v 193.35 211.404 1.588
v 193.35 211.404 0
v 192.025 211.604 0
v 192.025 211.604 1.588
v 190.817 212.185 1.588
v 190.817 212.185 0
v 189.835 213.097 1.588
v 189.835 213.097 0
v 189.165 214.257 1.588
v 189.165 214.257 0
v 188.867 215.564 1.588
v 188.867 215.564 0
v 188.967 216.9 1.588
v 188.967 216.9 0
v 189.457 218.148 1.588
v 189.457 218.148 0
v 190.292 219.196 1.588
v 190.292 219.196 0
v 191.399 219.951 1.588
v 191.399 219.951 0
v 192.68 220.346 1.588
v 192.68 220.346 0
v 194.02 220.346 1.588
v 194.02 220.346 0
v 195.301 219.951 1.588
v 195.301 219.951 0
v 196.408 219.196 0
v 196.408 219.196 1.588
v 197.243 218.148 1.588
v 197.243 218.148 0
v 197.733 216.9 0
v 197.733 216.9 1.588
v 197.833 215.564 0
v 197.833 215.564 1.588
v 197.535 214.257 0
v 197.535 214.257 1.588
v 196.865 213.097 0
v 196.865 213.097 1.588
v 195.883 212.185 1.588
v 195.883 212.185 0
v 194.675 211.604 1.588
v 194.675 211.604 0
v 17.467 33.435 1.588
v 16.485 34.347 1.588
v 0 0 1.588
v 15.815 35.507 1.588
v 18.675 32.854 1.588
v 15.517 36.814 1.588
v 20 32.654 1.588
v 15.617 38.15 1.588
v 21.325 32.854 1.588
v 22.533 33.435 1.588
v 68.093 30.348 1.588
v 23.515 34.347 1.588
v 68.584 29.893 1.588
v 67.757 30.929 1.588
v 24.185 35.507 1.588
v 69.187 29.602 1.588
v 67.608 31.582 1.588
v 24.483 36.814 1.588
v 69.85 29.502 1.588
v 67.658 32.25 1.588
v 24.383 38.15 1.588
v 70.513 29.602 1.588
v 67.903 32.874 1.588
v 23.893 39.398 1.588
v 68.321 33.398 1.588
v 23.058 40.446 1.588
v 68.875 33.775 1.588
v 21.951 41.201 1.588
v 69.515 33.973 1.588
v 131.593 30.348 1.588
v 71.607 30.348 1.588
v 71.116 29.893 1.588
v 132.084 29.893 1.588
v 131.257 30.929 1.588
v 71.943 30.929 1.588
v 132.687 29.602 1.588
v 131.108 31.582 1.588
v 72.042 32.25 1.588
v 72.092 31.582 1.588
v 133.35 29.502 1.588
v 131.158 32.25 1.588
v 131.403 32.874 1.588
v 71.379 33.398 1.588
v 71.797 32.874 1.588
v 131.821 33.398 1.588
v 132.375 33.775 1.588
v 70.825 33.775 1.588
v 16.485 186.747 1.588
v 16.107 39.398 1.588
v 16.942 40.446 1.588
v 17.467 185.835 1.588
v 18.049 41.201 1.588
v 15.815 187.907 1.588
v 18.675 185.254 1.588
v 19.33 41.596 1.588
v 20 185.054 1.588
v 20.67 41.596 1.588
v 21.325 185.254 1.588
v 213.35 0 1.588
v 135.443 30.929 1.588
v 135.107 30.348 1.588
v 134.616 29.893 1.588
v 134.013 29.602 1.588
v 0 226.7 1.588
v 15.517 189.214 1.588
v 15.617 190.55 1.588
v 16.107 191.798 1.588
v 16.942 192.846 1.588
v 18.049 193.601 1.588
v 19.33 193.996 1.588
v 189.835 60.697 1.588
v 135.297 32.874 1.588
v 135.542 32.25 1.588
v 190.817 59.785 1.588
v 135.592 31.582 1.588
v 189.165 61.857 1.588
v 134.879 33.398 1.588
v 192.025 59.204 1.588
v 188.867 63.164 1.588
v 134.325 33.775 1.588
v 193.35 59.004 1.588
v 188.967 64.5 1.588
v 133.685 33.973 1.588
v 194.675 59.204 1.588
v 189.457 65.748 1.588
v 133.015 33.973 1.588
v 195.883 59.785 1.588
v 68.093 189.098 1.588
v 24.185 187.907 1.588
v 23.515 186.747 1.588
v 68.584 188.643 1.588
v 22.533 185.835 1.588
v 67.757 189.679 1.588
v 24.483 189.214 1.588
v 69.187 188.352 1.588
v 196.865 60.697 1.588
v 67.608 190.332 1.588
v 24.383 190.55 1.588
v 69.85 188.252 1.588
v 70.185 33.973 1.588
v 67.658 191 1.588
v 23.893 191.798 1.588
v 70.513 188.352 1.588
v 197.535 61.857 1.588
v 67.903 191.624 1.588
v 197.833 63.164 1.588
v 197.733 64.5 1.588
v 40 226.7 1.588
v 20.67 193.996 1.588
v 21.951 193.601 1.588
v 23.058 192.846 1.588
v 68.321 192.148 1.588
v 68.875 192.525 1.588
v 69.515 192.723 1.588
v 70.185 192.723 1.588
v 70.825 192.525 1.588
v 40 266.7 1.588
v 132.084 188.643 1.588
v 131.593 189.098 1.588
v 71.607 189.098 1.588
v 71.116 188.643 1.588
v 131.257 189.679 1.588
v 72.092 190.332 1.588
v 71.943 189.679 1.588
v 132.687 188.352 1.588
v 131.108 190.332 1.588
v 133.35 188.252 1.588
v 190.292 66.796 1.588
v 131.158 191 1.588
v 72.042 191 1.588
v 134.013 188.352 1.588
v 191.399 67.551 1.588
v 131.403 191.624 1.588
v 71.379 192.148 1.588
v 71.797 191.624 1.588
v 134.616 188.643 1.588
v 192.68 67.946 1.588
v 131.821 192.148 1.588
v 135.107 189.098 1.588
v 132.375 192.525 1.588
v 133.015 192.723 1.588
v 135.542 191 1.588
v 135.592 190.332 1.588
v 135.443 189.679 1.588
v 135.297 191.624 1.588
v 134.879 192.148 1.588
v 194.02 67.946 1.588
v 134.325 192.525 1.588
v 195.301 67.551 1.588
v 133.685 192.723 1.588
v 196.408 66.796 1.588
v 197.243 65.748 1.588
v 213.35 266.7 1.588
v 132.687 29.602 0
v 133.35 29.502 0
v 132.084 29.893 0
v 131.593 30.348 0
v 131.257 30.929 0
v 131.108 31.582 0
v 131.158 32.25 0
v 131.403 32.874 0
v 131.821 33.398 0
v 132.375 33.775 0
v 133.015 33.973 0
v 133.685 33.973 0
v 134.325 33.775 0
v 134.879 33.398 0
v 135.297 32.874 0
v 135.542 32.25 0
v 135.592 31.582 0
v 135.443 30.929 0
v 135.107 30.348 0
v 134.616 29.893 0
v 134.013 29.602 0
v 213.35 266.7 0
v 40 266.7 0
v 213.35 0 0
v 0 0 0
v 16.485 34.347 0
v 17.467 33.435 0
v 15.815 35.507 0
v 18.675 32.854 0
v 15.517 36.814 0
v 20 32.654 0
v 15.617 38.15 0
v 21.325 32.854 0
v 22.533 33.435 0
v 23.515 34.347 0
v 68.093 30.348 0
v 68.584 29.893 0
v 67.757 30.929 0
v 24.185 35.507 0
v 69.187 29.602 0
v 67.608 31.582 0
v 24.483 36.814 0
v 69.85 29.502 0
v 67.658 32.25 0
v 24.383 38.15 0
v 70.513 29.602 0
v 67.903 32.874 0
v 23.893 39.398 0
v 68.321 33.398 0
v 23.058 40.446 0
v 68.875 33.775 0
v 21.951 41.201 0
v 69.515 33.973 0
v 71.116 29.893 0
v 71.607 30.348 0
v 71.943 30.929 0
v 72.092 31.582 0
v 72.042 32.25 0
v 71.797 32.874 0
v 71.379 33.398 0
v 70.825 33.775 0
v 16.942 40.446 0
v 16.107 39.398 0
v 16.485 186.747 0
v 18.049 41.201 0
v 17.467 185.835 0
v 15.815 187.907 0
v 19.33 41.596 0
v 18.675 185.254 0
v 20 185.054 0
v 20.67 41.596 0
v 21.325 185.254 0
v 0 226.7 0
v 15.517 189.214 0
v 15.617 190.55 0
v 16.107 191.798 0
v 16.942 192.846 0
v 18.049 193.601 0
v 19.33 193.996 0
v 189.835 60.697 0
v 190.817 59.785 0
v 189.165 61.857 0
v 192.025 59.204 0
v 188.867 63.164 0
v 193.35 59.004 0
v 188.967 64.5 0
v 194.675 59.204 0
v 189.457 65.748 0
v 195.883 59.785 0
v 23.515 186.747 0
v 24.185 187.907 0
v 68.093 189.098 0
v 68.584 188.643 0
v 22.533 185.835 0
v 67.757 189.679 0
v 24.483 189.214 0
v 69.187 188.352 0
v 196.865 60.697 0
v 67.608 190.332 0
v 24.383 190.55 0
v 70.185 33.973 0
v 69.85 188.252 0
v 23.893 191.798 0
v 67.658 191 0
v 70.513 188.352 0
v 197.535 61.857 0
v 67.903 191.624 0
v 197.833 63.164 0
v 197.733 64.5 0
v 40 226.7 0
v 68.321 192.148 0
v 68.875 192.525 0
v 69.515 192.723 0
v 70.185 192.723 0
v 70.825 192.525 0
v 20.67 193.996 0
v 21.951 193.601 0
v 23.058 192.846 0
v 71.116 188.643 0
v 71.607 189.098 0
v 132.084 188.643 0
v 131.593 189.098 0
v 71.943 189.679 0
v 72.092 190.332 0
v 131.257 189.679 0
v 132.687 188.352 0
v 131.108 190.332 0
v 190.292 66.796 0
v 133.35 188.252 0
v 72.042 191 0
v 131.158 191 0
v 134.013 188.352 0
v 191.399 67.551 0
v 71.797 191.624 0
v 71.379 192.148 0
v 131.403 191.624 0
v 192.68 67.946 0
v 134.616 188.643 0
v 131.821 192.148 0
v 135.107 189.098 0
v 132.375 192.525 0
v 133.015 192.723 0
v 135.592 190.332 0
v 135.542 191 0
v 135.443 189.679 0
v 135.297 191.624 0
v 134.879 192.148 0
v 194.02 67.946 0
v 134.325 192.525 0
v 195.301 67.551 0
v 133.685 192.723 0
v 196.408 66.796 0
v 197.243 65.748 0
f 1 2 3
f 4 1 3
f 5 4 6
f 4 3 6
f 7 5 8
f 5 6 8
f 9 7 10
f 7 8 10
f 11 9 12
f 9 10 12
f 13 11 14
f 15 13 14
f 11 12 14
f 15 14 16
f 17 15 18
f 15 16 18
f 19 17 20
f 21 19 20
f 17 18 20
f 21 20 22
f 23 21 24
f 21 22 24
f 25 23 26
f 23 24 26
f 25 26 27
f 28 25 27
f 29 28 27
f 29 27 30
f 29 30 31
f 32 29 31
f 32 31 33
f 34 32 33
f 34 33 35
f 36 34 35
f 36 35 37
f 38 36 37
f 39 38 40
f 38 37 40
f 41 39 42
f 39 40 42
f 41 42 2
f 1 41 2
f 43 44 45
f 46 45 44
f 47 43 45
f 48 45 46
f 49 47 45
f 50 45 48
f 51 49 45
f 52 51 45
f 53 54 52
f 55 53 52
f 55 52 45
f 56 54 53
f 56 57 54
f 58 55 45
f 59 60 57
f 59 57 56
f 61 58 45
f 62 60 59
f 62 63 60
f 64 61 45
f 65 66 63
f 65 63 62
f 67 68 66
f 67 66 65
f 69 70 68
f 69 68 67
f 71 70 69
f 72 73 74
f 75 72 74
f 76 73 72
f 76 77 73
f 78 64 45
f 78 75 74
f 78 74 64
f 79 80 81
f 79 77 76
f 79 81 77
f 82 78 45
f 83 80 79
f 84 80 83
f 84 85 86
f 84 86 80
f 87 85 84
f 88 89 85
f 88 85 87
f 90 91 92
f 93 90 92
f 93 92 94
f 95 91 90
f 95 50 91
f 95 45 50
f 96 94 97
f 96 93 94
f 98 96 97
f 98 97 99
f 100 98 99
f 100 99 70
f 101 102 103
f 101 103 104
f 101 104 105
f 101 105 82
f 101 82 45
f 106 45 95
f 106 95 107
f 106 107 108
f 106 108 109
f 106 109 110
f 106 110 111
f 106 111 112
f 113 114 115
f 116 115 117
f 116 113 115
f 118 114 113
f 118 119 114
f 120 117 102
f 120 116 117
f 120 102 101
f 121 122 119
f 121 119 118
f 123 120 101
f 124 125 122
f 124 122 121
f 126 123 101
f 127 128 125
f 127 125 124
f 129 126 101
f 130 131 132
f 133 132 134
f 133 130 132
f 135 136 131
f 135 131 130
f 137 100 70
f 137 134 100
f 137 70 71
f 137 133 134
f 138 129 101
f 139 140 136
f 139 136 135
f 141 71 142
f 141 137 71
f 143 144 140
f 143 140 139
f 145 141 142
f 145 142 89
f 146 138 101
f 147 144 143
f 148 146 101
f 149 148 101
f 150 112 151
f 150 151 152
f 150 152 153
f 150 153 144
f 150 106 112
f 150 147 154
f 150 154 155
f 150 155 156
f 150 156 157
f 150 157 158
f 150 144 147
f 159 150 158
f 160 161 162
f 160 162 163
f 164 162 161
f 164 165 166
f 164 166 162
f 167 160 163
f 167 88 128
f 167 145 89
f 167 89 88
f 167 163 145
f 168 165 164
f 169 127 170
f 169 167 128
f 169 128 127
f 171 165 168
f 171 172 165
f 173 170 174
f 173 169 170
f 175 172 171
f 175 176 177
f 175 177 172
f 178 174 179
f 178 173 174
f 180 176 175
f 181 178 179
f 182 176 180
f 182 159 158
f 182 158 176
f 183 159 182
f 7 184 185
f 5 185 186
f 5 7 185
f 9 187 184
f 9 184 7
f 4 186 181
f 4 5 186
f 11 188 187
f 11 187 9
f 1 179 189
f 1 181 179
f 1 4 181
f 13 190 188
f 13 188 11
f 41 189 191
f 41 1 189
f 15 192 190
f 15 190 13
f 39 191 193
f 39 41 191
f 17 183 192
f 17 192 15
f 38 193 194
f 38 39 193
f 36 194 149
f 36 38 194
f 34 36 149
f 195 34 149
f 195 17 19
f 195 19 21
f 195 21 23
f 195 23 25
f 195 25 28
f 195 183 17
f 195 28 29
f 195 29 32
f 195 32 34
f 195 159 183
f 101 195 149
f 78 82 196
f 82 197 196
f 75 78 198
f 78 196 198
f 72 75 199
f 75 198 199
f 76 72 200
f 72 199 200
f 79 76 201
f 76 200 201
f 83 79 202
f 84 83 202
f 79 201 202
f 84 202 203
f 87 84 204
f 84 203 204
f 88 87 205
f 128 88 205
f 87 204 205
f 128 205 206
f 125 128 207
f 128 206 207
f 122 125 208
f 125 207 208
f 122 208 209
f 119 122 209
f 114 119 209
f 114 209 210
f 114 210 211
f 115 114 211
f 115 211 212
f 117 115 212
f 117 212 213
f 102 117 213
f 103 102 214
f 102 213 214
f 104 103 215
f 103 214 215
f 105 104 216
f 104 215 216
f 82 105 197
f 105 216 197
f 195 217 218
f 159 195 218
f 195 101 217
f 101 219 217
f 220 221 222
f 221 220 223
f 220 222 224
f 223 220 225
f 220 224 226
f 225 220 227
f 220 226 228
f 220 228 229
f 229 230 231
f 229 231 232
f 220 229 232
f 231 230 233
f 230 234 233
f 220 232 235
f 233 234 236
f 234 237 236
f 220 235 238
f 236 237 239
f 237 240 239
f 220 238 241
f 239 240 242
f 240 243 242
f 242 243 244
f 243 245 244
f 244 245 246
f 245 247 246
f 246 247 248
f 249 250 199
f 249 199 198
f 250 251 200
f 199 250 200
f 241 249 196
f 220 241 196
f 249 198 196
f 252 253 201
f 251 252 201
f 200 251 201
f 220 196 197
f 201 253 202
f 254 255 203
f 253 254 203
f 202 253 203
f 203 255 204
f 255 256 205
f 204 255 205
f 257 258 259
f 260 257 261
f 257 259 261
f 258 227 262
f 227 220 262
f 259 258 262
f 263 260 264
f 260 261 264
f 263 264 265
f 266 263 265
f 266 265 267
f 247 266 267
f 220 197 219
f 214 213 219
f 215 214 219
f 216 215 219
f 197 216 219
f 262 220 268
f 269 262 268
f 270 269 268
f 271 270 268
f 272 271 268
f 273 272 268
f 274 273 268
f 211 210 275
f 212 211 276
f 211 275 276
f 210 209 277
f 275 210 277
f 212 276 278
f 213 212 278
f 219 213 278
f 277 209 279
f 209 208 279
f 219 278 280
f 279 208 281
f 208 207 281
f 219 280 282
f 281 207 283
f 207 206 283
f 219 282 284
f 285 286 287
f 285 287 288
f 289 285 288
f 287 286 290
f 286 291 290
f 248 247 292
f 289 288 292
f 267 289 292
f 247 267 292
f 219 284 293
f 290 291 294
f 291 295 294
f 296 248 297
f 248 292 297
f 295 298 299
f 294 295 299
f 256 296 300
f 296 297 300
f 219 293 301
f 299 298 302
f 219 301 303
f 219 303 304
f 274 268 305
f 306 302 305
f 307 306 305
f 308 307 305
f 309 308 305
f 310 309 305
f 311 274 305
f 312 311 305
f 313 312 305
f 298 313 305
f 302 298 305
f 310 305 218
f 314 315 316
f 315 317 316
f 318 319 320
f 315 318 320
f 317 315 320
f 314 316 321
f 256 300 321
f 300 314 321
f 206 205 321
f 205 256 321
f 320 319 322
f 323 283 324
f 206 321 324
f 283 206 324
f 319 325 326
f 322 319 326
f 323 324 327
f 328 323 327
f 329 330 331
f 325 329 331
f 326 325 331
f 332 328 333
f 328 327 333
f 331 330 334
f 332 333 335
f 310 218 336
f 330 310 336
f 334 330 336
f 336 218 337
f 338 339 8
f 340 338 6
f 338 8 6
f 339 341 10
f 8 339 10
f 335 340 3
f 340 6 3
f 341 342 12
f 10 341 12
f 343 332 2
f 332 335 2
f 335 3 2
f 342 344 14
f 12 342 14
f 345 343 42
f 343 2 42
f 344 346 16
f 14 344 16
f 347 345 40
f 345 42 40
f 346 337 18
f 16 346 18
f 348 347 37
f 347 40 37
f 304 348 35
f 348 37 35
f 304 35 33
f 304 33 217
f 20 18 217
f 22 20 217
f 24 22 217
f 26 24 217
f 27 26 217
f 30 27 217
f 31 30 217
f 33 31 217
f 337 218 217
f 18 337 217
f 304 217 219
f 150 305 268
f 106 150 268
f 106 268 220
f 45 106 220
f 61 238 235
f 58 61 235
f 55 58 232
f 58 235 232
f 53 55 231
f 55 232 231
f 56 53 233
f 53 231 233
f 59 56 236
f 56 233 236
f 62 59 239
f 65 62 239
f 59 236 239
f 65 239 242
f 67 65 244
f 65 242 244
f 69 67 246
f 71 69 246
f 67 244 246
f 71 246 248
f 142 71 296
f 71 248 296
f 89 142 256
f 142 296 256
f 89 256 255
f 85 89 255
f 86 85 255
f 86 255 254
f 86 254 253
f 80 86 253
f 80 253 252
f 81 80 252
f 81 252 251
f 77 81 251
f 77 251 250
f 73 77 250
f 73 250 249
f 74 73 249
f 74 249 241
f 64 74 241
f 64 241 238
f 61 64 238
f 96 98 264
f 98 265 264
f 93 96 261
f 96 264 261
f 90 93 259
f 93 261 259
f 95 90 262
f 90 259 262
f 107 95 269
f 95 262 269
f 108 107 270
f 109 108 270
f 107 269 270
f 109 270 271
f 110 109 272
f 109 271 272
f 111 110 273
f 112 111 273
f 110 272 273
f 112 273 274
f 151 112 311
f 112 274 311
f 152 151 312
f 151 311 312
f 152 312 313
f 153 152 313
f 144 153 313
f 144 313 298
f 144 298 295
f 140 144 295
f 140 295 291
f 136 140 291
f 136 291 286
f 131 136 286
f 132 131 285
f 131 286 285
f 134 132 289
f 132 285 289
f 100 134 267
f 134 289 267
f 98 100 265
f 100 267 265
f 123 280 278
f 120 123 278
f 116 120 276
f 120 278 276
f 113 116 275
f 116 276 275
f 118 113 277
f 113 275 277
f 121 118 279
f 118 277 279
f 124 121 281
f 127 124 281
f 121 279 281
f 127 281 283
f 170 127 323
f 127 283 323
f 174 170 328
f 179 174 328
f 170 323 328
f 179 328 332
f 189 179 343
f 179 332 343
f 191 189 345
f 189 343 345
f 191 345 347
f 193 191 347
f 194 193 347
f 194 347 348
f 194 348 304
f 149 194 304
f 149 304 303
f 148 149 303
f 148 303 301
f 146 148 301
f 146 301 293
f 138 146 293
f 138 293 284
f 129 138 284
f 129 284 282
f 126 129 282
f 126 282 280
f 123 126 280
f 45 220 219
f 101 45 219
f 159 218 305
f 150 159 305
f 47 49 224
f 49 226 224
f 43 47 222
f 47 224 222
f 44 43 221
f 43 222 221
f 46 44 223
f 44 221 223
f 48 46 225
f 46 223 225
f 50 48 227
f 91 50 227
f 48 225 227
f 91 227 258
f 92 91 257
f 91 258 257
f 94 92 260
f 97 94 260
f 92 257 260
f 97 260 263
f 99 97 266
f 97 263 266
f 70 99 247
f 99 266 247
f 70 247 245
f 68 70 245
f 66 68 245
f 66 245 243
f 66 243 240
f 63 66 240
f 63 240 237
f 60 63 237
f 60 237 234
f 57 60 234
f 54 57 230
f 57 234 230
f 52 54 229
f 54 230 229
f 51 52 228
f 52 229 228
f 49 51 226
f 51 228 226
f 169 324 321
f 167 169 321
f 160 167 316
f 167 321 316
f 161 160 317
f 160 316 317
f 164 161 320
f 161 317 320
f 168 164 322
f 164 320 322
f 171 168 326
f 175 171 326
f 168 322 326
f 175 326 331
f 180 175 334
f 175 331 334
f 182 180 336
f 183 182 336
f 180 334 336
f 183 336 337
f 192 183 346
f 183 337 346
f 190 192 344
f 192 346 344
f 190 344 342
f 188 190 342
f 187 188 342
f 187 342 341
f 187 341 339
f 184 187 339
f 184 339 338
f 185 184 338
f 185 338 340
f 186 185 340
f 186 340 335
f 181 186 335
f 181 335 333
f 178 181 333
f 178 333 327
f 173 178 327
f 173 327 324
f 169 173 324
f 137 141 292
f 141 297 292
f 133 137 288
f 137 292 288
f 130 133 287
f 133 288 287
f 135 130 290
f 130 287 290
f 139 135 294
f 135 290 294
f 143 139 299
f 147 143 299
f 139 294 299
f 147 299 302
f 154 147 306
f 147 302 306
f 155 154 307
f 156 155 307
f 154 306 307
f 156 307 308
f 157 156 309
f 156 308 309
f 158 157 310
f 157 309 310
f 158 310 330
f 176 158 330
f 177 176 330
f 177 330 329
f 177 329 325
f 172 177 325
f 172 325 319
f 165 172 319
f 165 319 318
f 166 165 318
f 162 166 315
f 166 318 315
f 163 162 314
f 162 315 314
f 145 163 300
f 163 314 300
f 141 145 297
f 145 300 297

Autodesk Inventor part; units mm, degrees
ref_plane "YZ Plane" through (0, 0, 0) normal (1, 0, 0) x (0, 1, 0)
ref_plane "XZ Plane" through (0, 0, 0) normal (0, 1, 0) x (-1, 0, 0)
ref_plane "XY Plane" through (0, 0, 0) normal (0, 0, 1) x (1, 0, 0)
sketch "Sketch1" plane through (0, 0, 0) normal (0, 0, 1) x (1, 0, 0)
  line L0 (0, 0) -> (213.35, 0)
  line L1 (213.35, 0) -> (213.35, 266.7)
  line L2 (213.35, 266.7) -> (0, 266.7)
  line L3 (0, 266.7) -> (0, 0)
  line L4 (0, 0) -> (41.275, 0)
  line L5 (0, 41.275) -> (0, 0)
  line L6 (0, 266.7) -> (40, 266.7)
  line L7 (40, 266.7) -> (40, 226.7)
  line L8 (40, 226.7) -> (0, 226.7)
  line L9 (0, 226.7) -> (0, 266.7)
  dimension "d0" = 266.7
  dimension "d1" = 213.35
  dimension "d4" = 40
extrude "Extrusion1" add sketch "Sketch1" along normal blind 1.5875 contours L3 L8 L7 L2 L1 L0
sketch "Sketch2" plane through (0, 0, 1.5875) normal (0, 0, 1) x (1, 0, 0)
  line L0 (213.35, 0) -> (0, 0)
  line L1 (213.35, 266.7) -> (213.35, 0)
  line L2 (40, 266.7) -> (213.35, 266.7)
  line L3 (20, 189.55) -> (20, 37.15)
  line L4 (40, 266.7) -> (40, 226.7) projected
  line L5 (40, 266.7) -> (213.35, 266.7) projected
  line L6 (0, 0) -> (0, 226.7)
  line L7 (0, 226.7) -> (40, 226.7)
  line L8 (213.35, 266.7) -> (213.35, 0) projected
  line L9 (193.35, 215.9) -> (193.35, 63.5)
  point P0 (41.275, 0)
  point P1 (126.675, 266.7)
  point P2 (20, 113.35)
  point P3 (0, 113.35)
  dimension "d9" = 152.4
  dimension "d19" = 20
  dimension "d31" = 152.4
  dimension "d32" = 20
  dimension "d33" = 50.8
hole "Mounting Holes" at (20, 189.55, 1.5875) at (20, 37.15, 1.5875) at (193.35, 215.9, 1.5875) at (193.35, 63.5, 1.5875) direction (0, 0, -1) diameter 8.9916 end through all clearance for "Flat Head Machine Screw" size "M8" standard "Ansi Metric M Profile"
sketch "Sketch3" plane through (0, 0, 1.5875) normal (0, 0, 1) x (1, 0, 0)
  line L0 (0, 0) -> (0, 226.7) projected
  line L1 (40, 266.7) -> (213.35, 266.7) projected
  line L2 (69.85, 190.5) -> (133.35, 190.5)
  line L3 (133.35, 190.5) -> (133.35, 31.75)
  line L4 (133.35, 31.75) -> (69.85, 31.75)
  line L5 (69.85, 31.75) -> (69.85, 190.5)
  dimension "d20" = 69.85
  dimension "d21" = 63.5
  dimension "d22" = 158.75
  dimension "d23" = 76.2
hole "PSU Mounting Holes" at (69.85, 190.5, 1.5875) at (133.35, 190.5, 1.5875) at (69.85, 31.75, 1.5875) at (133.35, 31.75, 1.5875) direction (0, 0, -1) diameter 4.4958 end through all clearance for "Flat Head Machine Screw (82)" size "#8" standard "Ansi Unified Screw Threads"
properties part number "front right plate" material "Aluminum-6061"
